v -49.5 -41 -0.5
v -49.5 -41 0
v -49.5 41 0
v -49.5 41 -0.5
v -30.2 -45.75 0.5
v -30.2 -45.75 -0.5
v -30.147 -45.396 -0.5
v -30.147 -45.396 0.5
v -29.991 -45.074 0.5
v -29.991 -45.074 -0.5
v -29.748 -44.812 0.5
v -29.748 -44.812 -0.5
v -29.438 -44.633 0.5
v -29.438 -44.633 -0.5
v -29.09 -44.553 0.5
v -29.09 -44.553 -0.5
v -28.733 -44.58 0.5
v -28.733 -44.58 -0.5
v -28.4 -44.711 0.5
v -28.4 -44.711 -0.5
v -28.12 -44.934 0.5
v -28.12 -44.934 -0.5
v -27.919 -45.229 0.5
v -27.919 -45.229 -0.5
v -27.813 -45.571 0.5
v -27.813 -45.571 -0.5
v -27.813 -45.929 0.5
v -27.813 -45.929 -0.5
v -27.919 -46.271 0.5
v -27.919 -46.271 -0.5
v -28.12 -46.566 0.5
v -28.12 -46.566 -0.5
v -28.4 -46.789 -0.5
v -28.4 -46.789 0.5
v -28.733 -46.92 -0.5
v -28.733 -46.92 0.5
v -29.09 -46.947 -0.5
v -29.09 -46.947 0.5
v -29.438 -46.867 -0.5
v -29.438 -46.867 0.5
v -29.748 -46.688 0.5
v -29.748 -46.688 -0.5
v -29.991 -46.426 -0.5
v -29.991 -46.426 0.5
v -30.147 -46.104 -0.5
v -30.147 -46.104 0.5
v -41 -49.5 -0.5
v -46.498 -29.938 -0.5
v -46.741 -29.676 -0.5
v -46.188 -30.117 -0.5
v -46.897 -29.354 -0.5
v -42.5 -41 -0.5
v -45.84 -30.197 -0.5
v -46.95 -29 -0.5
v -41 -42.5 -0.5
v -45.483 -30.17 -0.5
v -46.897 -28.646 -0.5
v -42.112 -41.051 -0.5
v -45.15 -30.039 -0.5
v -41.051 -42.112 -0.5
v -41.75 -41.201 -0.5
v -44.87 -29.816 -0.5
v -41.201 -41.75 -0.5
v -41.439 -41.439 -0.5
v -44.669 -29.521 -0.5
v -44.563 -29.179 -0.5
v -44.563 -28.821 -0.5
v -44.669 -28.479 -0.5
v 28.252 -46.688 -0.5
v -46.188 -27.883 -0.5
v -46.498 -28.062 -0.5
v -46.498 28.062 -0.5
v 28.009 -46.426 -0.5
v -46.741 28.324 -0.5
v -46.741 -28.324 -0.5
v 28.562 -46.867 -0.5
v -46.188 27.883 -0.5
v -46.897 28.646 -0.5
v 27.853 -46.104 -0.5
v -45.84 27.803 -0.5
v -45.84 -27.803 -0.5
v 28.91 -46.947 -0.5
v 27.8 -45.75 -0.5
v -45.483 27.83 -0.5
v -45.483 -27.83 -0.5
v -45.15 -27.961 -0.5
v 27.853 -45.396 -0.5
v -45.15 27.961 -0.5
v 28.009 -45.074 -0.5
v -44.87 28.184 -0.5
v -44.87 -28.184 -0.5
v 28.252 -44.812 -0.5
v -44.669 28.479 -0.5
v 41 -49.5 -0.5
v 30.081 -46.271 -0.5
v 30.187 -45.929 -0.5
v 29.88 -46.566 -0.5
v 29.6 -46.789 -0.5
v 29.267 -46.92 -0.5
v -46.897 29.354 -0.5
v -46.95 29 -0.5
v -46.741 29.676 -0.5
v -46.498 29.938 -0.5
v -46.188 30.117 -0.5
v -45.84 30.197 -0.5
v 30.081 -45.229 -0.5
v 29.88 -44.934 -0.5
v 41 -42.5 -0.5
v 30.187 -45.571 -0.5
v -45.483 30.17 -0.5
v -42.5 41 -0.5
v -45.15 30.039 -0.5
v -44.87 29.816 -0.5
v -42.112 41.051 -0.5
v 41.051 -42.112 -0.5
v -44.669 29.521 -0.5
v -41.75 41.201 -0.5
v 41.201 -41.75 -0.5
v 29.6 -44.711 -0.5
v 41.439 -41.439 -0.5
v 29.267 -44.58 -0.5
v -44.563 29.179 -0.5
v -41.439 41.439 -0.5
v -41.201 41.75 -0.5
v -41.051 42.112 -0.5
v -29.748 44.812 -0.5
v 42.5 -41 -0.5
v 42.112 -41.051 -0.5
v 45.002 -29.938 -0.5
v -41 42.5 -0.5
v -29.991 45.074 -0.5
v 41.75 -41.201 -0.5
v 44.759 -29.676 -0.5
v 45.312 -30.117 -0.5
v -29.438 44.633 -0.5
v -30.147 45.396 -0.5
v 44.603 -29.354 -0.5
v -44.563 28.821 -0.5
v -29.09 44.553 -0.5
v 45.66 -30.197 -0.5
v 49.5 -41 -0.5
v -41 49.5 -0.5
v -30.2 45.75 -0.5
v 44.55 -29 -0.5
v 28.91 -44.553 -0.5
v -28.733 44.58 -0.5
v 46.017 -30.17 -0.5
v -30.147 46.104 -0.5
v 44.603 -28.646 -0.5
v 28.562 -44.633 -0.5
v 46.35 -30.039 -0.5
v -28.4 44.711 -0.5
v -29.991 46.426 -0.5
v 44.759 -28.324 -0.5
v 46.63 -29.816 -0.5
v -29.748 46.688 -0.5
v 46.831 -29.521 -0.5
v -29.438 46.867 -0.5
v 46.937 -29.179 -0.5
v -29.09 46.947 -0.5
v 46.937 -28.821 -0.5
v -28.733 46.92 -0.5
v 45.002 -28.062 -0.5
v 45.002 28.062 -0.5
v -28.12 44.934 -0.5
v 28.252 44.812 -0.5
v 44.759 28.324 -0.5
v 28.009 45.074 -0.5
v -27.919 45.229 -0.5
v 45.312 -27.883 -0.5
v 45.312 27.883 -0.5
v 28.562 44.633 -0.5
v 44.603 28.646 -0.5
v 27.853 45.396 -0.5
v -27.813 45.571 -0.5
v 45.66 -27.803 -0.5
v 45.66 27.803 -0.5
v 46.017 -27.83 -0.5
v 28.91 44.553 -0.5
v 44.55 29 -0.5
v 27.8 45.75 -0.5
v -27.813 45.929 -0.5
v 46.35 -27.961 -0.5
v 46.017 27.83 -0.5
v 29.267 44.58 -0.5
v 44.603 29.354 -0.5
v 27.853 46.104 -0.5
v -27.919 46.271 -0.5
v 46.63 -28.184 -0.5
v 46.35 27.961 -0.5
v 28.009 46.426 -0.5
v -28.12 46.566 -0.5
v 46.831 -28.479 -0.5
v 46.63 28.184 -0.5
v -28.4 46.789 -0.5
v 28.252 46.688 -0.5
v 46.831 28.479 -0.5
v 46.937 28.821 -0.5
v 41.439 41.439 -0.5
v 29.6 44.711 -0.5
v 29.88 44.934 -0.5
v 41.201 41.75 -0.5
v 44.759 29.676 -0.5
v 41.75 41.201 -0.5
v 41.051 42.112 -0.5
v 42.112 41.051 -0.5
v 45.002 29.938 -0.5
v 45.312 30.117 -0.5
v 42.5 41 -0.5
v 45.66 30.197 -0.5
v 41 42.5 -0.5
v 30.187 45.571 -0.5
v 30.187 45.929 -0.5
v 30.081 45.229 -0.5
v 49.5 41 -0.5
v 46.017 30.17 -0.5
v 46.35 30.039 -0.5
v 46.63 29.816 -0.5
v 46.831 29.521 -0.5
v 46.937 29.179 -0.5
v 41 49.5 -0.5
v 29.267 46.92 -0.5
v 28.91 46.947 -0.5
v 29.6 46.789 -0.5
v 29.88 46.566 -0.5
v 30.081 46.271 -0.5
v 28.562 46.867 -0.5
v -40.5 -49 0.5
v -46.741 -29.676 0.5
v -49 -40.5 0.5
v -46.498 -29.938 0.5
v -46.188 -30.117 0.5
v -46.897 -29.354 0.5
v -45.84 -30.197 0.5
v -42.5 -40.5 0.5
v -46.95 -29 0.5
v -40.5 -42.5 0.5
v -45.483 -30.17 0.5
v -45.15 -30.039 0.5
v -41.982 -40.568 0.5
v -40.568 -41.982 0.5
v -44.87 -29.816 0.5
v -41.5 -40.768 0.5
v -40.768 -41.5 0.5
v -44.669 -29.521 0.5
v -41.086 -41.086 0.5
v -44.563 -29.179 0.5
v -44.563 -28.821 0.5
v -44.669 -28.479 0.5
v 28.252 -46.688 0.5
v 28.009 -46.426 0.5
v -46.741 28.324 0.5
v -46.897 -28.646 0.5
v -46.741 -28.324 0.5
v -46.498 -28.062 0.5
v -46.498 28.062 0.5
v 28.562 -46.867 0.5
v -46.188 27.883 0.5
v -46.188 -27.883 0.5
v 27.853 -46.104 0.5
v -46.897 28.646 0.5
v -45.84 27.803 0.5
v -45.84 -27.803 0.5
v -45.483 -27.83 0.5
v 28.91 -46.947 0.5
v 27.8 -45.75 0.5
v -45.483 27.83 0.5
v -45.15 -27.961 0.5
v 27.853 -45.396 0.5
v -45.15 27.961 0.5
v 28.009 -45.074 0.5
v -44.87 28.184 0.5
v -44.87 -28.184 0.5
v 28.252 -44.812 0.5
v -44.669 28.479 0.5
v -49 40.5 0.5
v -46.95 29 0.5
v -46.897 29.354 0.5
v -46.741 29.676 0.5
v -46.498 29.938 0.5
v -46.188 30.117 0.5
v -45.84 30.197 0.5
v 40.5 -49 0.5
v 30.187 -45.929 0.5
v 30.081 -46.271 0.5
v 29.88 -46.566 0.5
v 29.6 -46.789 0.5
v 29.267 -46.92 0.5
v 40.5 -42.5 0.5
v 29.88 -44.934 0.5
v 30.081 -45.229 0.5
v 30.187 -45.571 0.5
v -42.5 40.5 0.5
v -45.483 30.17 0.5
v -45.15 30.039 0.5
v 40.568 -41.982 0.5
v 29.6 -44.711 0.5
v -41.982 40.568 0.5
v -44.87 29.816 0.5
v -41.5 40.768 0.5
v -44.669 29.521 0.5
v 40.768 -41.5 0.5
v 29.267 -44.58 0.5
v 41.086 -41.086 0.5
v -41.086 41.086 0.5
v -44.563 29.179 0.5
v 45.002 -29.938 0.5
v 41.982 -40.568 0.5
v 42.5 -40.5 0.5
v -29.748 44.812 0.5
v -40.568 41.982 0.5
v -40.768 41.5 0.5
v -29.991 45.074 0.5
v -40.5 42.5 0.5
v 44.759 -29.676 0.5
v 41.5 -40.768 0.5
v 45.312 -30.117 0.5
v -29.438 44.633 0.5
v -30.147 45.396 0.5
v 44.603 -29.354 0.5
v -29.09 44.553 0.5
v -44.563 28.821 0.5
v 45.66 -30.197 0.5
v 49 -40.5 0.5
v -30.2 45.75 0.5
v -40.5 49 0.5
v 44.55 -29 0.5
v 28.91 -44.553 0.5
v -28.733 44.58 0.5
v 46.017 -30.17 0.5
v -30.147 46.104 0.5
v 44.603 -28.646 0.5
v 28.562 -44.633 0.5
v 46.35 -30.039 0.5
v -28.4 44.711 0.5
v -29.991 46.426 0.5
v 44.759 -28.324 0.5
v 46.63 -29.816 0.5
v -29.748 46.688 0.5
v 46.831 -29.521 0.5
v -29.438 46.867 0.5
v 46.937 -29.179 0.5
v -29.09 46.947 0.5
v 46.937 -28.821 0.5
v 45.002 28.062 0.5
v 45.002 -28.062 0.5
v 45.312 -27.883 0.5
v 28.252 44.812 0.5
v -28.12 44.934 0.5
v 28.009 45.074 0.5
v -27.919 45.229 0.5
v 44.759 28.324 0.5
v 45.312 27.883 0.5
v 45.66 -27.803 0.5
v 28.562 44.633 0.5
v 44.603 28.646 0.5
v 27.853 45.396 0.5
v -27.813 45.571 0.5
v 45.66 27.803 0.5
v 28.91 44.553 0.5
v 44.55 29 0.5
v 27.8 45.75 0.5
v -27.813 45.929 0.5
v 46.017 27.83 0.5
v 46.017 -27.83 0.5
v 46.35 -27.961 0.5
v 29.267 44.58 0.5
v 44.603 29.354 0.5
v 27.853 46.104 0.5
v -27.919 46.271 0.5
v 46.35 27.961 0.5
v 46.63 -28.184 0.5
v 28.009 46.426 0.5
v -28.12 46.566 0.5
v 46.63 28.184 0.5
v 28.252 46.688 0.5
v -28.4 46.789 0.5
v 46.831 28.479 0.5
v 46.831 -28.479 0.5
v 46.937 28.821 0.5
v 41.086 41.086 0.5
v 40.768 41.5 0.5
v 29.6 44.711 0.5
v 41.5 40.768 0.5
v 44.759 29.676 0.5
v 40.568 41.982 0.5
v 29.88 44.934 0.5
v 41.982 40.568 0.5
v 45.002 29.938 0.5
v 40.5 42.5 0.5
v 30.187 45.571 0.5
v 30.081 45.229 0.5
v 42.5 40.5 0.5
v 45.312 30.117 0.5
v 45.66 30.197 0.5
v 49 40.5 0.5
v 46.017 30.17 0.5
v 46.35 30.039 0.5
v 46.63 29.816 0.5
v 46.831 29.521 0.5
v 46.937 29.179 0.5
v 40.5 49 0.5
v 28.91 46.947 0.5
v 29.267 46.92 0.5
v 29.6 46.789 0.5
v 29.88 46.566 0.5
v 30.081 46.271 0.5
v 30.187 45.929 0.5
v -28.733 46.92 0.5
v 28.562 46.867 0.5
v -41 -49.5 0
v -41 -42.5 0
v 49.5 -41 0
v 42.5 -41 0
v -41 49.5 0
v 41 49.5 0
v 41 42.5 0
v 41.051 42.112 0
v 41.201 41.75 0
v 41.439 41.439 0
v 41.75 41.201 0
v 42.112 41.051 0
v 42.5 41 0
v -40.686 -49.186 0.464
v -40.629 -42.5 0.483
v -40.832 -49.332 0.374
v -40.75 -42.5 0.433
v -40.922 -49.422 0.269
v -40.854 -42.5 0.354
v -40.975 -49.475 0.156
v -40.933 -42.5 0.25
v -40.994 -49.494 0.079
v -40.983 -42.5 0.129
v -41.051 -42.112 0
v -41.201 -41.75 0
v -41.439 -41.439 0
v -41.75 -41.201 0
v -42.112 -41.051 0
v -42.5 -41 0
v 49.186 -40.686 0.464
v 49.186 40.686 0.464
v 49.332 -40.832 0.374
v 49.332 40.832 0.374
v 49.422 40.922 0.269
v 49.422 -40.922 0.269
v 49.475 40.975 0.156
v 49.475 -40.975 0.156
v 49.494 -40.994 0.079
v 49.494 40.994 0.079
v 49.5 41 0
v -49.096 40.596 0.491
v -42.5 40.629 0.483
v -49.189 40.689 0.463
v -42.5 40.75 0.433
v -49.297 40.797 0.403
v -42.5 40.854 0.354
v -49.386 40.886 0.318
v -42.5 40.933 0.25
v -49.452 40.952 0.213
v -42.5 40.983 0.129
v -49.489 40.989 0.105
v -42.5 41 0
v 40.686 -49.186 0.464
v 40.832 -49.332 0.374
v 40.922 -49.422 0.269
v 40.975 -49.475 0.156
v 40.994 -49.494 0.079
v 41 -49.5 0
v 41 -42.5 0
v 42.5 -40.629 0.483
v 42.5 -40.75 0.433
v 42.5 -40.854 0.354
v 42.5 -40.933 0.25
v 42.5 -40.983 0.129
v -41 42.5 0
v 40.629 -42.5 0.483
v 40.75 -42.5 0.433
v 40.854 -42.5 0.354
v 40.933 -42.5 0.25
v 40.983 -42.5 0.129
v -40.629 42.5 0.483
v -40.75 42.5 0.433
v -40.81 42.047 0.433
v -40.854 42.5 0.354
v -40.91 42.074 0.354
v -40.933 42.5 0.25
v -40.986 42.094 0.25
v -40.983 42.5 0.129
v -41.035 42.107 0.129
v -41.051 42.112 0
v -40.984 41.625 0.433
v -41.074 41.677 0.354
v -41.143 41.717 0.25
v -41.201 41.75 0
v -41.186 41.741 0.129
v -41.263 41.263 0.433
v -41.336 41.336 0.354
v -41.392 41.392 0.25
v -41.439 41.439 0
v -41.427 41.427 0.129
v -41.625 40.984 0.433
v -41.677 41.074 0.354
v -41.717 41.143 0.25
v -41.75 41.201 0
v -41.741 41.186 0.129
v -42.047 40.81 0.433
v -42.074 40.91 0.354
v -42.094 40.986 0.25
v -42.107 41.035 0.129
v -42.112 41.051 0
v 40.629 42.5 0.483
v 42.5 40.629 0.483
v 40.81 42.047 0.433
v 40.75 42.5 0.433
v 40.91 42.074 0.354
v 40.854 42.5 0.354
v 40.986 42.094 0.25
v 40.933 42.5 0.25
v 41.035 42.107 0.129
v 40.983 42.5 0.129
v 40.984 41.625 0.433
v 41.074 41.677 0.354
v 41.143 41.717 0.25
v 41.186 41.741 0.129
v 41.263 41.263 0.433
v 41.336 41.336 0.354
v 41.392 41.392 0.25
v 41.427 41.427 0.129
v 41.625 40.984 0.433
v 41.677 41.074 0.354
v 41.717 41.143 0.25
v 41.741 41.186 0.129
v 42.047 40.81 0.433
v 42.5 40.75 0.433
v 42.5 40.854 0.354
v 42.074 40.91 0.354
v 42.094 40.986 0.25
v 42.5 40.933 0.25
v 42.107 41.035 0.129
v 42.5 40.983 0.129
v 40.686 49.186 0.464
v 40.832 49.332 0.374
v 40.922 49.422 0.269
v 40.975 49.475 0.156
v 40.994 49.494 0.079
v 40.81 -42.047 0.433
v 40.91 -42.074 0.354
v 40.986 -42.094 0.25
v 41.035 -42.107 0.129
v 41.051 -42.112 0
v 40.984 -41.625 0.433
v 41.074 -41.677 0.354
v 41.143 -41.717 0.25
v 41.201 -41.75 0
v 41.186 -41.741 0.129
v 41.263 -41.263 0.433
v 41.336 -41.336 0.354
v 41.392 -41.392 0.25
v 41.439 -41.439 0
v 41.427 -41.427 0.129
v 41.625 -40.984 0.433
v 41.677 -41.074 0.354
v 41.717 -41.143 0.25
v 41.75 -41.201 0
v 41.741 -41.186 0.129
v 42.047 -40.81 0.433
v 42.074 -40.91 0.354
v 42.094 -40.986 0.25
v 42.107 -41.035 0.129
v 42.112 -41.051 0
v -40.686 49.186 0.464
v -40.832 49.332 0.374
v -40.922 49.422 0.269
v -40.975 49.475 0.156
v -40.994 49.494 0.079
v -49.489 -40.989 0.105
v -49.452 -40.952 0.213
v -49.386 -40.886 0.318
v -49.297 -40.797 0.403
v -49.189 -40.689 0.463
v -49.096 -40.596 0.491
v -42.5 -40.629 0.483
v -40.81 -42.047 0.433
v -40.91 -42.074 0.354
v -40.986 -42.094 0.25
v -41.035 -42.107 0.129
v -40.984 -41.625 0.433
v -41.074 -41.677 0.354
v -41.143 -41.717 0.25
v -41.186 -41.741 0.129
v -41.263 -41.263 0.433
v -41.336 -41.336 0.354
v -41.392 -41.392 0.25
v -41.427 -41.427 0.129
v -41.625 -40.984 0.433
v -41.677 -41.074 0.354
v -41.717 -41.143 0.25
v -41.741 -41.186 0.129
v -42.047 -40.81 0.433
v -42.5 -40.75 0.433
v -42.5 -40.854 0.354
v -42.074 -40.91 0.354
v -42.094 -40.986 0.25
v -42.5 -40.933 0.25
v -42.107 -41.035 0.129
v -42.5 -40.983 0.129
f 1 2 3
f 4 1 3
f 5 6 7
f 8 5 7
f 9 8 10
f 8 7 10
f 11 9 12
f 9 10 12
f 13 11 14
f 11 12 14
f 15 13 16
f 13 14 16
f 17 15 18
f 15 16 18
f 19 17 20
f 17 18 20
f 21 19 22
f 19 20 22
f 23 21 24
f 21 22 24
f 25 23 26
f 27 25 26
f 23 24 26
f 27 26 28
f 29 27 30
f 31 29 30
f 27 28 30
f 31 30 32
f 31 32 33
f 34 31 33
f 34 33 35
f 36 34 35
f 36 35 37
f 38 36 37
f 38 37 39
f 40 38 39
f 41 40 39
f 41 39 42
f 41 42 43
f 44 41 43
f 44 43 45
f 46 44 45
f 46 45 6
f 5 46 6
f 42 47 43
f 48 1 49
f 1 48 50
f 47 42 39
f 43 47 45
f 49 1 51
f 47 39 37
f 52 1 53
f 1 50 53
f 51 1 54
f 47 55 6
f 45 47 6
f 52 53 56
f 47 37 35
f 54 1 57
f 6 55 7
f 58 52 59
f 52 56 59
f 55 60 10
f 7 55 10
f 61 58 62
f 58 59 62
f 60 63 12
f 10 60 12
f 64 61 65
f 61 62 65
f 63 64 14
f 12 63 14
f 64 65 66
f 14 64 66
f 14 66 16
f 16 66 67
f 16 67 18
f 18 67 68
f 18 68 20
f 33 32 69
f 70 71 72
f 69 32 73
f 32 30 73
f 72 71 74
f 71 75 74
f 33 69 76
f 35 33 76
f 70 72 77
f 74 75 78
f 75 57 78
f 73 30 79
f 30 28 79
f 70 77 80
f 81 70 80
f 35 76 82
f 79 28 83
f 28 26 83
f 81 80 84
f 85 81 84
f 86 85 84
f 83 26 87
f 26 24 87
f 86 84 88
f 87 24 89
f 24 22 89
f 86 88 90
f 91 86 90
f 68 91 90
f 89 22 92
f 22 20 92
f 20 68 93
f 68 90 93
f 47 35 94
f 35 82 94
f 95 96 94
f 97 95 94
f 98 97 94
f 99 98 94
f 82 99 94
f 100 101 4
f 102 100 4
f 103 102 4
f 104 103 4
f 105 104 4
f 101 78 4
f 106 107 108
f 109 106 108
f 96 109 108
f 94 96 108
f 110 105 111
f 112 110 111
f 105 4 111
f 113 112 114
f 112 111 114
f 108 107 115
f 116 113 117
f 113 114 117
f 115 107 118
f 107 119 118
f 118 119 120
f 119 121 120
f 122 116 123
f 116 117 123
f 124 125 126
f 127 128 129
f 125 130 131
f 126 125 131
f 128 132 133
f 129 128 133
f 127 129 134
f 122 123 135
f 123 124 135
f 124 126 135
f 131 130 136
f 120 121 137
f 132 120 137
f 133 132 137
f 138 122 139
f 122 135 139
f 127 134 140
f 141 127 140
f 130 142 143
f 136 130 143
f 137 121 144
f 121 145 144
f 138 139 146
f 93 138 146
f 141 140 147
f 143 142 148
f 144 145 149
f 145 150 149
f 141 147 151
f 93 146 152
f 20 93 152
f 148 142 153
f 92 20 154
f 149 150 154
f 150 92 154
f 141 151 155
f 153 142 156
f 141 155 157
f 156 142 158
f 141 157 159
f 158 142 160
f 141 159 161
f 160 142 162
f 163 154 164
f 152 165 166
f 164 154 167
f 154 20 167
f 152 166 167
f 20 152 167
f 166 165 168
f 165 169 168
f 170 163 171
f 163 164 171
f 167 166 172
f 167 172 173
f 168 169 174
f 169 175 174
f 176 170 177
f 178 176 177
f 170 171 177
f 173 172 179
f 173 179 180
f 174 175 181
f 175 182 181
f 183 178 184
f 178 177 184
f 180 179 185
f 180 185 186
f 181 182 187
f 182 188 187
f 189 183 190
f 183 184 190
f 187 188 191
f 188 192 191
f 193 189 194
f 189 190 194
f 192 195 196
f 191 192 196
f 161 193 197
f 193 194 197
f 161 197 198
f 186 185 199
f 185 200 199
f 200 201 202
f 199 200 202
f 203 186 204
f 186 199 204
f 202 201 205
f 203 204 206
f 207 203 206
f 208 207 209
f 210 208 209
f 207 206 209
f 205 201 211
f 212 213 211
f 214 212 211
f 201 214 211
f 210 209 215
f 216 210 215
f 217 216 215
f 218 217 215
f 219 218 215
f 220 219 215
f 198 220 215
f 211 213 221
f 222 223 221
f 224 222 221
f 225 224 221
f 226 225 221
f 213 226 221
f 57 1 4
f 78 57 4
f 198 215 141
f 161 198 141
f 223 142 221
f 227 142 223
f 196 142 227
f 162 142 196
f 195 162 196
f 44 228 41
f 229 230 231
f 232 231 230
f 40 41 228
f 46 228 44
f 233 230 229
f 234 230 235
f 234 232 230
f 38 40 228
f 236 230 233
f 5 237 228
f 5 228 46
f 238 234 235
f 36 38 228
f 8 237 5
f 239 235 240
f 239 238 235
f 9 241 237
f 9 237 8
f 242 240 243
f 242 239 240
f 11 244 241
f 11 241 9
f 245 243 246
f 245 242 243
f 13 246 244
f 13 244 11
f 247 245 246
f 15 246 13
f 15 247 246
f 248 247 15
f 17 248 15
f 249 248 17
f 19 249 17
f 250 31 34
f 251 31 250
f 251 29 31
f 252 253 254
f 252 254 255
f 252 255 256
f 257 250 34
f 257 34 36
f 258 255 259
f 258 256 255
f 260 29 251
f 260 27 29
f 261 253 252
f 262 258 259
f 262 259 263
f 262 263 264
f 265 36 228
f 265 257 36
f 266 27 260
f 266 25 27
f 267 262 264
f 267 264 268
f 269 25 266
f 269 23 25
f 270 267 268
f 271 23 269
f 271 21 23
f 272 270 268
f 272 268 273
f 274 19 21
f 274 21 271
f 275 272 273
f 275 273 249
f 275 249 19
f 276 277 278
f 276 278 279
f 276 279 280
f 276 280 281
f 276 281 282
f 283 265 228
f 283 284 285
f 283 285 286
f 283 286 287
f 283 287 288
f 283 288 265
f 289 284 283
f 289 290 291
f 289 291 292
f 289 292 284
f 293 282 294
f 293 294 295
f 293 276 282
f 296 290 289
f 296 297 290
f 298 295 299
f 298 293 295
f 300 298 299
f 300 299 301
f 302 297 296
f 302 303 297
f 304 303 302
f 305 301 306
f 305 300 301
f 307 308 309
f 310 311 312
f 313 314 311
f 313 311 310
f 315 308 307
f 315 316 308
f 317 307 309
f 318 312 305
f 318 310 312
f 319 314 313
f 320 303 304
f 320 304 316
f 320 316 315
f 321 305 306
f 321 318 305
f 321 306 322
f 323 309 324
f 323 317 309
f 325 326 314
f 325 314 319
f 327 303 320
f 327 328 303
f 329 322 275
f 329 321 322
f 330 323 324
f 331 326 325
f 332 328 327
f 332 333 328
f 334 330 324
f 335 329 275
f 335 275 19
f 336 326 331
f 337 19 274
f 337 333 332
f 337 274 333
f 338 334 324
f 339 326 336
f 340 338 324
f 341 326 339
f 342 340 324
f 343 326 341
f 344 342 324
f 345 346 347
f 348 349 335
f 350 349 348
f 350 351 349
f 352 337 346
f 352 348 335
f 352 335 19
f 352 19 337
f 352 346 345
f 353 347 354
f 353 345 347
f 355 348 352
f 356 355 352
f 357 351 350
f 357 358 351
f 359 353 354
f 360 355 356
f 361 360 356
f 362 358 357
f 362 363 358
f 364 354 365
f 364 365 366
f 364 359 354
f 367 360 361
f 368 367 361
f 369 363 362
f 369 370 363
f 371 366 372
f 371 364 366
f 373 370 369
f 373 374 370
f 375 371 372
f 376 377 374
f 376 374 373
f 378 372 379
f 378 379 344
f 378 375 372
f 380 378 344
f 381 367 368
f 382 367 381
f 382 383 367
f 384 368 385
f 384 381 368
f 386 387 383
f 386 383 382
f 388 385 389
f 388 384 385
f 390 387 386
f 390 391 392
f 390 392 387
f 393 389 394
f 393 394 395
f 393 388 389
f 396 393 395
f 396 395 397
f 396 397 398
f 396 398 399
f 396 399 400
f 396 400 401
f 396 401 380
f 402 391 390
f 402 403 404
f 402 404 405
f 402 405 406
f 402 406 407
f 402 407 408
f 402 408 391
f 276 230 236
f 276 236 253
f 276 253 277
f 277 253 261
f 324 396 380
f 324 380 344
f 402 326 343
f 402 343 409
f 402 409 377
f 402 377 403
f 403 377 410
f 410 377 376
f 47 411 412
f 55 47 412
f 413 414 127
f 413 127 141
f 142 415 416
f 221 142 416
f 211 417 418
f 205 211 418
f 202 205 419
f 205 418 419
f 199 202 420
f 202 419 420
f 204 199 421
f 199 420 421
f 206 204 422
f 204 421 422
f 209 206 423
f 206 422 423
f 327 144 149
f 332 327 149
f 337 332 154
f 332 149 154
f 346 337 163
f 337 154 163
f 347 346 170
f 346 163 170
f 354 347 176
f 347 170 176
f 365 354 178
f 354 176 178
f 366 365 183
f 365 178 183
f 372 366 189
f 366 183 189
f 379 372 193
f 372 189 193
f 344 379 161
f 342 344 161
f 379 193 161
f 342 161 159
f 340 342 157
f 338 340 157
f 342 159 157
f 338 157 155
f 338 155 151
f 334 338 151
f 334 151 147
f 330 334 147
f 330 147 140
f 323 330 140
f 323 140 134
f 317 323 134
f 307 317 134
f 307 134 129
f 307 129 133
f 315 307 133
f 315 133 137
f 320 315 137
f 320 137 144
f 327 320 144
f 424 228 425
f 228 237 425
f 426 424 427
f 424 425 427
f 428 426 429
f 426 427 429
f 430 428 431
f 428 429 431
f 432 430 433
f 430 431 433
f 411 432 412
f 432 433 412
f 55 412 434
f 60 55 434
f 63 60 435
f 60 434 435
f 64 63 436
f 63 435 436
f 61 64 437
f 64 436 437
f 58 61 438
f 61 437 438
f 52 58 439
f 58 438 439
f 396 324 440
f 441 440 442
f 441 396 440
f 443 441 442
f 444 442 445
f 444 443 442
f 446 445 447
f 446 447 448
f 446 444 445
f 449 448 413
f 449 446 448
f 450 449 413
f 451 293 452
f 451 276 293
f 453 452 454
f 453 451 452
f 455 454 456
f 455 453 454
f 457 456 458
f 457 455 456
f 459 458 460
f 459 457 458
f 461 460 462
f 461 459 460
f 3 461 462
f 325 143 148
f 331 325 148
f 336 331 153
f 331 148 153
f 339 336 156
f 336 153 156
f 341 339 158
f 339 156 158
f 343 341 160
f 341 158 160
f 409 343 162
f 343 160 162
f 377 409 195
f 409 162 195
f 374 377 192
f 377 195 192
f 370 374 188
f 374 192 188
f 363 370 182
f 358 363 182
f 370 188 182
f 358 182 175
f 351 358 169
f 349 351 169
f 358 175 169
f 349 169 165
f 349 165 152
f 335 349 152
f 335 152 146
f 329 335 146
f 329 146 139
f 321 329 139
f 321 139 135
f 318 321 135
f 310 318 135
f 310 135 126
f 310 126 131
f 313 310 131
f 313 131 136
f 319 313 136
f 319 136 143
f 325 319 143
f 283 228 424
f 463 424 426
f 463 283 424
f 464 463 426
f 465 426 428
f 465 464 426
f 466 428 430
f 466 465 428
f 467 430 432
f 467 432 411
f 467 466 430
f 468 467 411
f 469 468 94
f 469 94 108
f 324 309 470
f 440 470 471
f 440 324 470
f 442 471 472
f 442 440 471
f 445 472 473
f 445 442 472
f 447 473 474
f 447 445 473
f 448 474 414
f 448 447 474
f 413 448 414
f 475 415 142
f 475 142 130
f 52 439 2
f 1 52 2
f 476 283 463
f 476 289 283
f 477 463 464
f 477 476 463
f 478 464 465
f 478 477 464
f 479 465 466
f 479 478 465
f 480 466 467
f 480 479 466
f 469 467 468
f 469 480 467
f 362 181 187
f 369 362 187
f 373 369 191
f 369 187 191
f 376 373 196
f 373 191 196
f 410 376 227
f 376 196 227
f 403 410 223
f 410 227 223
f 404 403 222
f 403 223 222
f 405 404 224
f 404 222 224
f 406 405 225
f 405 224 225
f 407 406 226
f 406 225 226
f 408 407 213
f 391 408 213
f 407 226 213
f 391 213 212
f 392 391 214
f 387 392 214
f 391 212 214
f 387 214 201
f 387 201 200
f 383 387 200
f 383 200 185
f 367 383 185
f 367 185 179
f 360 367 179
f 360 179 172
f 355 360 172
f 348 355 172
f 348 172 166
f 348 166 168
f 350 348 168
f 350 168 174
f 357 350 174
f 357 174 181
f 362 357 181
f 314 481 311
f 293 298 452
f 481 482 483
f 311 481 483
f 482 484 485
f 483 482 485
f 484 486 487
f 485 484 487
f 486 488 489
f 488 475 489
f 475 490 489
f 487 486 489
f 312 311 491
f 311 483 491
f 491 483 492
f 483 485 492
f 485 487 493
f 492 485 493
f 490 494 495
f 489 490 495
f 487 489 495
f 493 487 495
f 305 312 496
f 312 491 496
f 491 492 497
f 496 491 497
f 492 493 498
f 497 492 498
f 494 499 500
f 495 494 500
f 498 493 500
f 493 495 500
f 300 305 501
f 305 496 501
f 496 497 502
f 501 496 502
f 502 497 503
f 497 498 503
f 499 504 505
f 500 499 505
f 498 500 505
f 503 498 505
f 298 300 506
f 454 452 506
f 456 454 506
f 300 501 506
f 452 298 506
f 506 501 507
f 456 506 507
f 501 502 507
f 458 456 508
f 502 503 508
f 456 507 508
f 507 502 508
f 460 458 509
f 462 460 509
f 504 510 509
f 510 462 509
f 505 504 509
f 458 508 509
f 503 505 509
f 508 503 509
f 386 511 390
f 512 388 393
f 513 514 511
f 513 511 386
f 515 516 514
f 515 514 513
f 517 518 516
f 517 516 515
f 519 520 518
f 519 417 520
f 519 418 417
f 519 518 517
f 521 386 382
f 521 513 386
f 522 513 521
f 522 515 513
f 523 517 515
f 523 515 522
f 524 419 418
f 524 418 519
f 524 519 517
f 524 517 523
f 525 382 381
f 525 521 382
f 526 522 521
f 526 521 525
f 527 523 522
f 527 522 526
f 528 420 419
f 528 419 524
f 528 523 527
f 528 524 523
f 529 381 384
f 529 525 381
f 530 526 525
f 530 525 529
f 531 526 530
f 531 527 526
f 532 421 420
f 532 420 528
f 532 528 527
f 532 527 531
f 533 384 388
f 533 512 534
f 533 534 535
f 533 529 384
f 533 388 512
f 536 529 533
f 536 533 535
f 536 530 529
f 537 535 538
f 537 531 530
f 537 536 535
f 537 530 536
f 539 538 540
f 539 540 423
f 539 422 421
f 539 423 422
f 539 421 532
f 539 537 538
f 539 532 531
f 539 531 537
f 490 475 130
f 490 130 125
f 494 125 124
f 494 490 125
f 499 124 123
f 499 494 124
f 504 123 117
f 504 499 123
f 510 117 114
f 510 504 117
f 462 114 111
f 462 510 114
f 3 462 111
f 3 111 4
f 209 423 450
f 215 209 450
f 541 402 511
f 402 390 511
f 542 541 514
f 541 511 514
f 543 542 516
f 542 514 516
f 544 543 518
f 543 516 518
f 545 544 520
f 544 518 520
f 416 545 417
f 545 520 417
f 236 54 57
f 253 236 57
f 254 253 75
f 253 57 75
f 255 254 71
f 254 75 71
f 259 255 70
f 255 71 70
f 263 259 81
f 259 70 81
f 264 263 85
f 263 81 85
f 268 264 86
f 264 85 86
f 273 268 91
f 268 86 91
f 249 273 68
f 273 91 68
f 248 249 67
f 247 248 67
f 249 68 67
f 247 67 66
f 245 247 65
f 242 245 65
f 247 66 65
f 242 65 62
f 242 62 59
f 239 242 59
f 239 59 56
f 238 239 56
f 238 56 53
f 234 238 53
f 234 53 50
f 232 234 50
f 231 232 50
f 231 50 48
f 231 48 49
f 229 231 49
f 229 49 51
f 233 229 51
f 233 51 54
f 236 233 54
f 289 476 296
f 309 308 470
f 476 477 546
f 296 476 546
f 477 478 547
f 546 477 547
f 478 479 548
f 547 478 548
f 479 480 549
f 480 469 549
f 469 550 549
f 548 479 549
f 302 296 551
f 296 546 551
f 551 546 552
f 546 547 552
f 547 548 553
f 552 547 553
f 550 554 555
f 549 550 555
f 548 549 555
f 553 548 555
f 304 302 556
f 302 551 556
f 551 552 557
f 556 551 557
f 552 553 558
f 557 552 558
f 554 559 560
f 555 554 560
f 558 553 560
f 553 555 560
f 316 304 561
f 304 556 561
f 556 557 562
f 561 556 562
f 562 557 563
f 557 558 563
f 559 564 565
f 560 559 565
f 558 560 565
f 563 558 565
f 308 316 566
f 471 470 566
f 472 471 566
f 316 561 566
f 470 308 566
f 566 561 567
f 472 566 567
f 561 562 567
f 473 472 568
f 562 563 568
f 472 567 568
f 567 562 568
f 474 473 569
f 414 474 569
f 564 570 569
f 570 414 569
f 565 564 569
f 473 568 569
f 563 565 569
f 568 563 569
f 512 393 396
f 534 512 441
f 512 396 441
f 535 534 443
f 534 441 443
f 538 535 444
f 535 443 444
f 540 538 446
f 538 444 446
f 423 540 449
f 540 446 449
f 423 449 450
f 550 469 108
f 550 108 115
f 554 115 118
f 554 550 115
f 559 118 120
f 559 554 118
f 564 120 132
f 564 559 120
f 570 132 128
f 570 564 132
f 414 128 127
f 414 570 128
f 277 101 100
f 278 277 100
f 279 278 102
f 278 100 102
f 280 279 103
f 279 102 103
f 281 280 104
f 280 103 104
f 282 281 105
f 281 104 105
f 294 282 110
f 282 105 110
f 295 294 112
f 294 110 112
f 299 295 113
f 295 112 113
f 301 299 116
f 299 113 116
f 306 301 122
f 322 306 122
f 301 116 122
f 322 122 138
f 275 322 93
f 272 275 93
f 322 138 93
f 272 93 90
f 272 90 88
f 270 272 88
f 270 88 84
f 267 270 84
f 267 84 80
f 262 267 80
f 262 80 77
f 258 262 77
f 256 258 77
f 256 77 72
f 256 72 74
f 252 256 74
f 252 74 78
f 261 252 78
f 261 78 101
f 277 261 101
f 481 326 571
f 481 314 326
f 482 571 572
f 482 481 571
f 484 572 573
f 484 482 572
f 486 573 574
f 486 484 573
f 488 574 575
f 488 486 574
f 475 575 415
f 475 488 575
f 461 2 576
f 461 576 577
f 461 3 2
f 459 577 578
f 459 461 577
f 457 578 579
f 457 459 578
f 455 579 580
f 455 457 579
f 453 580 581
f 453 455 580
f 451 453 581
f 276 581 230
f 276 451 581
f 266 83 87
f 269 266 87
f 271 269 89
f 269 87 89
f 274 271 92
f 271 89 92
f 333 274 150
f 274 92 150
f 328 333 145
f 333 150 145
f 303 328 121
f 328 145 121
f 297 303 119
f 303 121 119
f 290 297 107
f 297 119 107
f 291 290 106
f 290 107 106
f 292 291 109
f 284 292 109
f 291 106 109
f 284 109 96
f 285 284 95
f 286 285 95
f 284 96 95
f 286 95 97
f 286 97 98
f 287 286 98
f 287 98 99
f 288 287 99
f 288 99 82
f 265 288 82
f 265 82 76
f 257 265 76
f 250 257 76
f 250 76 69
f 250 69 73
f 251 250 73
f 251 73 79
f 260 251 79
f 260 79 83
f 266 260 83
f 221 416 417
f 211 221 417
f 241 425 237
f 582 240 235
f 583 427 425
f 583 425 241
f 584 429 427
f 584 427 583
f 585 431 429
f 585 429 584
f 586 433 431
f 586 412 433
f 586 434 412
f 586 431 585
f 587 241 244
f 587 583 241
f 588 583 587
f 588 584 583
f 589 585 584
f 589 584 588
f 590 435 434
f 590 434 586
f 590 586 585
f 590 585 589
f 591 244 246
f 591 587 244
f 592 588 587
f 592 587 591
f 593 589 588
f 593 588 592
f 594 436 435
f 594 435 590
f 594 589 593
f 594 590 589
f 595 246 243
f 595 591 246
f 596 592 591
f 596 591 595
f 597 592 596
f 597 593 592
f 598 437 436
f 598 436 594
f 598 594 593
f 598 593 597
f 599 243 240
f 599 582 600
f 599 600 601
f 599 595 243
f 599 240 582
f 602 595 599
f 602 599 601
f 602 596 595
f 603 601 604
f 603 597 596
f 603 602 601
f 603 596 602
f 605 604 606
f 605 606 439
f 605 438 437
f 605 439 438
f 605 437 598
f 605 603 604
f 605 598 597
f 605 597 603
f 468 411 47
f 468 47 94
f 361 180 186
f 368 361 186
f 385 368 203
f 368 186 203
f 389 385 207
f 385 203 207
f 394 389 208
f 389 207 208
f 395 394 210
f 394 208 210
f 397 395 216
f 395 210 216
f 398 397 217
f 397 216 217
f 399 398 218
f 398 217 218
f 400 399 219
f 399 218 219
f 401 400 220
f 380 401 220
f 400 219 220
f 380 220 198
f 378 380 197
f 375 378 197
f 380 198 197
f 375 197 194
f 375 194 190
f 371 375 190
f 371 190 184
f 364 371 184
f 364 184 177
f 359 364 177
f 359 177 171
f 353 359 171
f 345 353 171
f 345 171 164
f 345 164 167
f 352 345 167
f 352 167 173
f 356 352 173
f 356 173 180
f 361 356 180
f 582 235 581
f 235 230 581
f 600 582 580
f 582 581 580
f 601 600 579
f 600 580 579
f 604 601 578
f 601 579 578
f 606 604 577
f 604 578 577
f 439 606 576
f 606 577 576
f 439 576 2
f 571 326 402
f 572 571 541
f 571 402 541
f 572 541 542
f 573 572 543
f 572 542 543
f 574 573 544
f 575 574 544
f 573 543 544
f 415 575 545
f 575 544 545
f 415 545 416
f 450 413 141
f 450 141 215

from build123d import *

# Parameters (mm, degrees)
SKETCH1_W           = 99
SKETCH1_H           = 99
BOSS_EXTRUDE1_DEPTH = 0.5
CUT_EXTRUDE1_DEPTH  = 71.010713466
M2_HOLE1_B_D        = 2.4
M2_HOLE1_B_DEPTH    = 3
M2_HOLE1_B_TIP      = 0.721032743
FILLET1_R           = 0.5


with BuildPart() as part:
    # Sketch1 → Boss-Extrude1 (new, symmetric)
    with BuildSketch(Plane.XY):
        Rectangle(SKETCH1_W, SKETCH1_H)
    extrude(amount=BOSS_EXTRUDE1_DEPTH, both=True)

    # Sketch2 → Cut-Extrude1 (cut, through all)
    with BuildSketch(Plane.XY.offset(0.5)):
        with BuildLine():
            Line((-49.5, 49.5), (-41, 49.5))
            Line((-41, 49.5), (-41, 42.5))
            ThreePointArc((-41, 42.5), (-41.439339828, 41.439339828), (-42.5, 41))
            Line((-42.5, 41), (-49.5, 41))
            Line((-49.5, 41), (-49.5, 49.5))
        make_face()
        with BuildLine():
            Line((49.5, 49.5), (41, 49.5))
            Line((41, 49.5), (41, 42.5))
            ThreePointArc((41, 42.5), (41.439339828, 41.439339828), (42.5, 41))
            Line((42.5, 41), (49.5, 41))
            Line((49.5, 41), (49.5, 49.5))
        make_face()
        with BuildLine():
            Line((-49.5, -49.5), (-41, -49.5))
            Line((-41, -49.5), (-41, -42.5))
            ThreePointArc((-41, -42.5), (-41.439339828, -41.439339828), (-42.5, -41))
            Line((-42.5, -41), (-49.5, -41))
            Line((-49.5, -41), (-49.5, -49.5))
        make_face()
        with BuildLine():
            Line((49.5, -49.5), (41, -49.5))
            Line((41, -49.5), (41, -42.5))
            ThreePointArc((41, -42.5), (41.439339828, -41.439339828), (42.5, -41))
            Line((42.5, -41), (49.5, -41))
            Line((49.5, -41), (49.5, -49.5))
        make_face()
    extrude(amount=-CUT_EXTRUDE1_DEPTH, mode=Mode.SUBTRACT)

    # M2 Hole1 - B
    with Locations(Plane.XY.offset(0.5)):
        with Locations((-45.75, 29), (-29, 45.75), (29, 45.75), (45.75, 29), (45.75, -29), (29, -45.75), (-29, -45.75), (-45.75, -29)):
            Hole(M2_HOLE1_B_D / 2, depth=M2_HOLE1_B_DEPTH)
            with Locations((0, 0, -(M2_HOLE1_B_DEPTH + M2_HOLE1_B_TIP / 2))):  # 118° drill point
                Cone(0, M2_HOLE1_B_D / 2, M2_HOLE1_B_TIP, mode=Mode.SUBTRACT)

    # Fillet1
    fillet1_edges = [part.edges().sort_by_distance(p)[0] for p in [
        (-49.5, 0, 0.5),
        (-46, 41, 0.5),
        (-41.439339828, 41.439339828, 0.5),
        (-41, 46, 0.5),
        (0, 49.5, 0.5),
        (41.439339828, 41.439339828, 0.5),
        (46, 41, 0.5),
        (41, 46, 0.5),
        (49.5, 0, 0.5),
        (41.439339828, -41.439339828, 0.5),
        (41, -46, 0.5),
        (46, -41, 0.5),
        (0, -49.5, 0.5),
        (-41, -46, 0.5),
        (-41.439339828, -41.439339828, 0.5),
        (-46, -41, 0.5),
    ]]
    fillet(fillet1_edges, radius=FILLET1_R)


solid = part.part
